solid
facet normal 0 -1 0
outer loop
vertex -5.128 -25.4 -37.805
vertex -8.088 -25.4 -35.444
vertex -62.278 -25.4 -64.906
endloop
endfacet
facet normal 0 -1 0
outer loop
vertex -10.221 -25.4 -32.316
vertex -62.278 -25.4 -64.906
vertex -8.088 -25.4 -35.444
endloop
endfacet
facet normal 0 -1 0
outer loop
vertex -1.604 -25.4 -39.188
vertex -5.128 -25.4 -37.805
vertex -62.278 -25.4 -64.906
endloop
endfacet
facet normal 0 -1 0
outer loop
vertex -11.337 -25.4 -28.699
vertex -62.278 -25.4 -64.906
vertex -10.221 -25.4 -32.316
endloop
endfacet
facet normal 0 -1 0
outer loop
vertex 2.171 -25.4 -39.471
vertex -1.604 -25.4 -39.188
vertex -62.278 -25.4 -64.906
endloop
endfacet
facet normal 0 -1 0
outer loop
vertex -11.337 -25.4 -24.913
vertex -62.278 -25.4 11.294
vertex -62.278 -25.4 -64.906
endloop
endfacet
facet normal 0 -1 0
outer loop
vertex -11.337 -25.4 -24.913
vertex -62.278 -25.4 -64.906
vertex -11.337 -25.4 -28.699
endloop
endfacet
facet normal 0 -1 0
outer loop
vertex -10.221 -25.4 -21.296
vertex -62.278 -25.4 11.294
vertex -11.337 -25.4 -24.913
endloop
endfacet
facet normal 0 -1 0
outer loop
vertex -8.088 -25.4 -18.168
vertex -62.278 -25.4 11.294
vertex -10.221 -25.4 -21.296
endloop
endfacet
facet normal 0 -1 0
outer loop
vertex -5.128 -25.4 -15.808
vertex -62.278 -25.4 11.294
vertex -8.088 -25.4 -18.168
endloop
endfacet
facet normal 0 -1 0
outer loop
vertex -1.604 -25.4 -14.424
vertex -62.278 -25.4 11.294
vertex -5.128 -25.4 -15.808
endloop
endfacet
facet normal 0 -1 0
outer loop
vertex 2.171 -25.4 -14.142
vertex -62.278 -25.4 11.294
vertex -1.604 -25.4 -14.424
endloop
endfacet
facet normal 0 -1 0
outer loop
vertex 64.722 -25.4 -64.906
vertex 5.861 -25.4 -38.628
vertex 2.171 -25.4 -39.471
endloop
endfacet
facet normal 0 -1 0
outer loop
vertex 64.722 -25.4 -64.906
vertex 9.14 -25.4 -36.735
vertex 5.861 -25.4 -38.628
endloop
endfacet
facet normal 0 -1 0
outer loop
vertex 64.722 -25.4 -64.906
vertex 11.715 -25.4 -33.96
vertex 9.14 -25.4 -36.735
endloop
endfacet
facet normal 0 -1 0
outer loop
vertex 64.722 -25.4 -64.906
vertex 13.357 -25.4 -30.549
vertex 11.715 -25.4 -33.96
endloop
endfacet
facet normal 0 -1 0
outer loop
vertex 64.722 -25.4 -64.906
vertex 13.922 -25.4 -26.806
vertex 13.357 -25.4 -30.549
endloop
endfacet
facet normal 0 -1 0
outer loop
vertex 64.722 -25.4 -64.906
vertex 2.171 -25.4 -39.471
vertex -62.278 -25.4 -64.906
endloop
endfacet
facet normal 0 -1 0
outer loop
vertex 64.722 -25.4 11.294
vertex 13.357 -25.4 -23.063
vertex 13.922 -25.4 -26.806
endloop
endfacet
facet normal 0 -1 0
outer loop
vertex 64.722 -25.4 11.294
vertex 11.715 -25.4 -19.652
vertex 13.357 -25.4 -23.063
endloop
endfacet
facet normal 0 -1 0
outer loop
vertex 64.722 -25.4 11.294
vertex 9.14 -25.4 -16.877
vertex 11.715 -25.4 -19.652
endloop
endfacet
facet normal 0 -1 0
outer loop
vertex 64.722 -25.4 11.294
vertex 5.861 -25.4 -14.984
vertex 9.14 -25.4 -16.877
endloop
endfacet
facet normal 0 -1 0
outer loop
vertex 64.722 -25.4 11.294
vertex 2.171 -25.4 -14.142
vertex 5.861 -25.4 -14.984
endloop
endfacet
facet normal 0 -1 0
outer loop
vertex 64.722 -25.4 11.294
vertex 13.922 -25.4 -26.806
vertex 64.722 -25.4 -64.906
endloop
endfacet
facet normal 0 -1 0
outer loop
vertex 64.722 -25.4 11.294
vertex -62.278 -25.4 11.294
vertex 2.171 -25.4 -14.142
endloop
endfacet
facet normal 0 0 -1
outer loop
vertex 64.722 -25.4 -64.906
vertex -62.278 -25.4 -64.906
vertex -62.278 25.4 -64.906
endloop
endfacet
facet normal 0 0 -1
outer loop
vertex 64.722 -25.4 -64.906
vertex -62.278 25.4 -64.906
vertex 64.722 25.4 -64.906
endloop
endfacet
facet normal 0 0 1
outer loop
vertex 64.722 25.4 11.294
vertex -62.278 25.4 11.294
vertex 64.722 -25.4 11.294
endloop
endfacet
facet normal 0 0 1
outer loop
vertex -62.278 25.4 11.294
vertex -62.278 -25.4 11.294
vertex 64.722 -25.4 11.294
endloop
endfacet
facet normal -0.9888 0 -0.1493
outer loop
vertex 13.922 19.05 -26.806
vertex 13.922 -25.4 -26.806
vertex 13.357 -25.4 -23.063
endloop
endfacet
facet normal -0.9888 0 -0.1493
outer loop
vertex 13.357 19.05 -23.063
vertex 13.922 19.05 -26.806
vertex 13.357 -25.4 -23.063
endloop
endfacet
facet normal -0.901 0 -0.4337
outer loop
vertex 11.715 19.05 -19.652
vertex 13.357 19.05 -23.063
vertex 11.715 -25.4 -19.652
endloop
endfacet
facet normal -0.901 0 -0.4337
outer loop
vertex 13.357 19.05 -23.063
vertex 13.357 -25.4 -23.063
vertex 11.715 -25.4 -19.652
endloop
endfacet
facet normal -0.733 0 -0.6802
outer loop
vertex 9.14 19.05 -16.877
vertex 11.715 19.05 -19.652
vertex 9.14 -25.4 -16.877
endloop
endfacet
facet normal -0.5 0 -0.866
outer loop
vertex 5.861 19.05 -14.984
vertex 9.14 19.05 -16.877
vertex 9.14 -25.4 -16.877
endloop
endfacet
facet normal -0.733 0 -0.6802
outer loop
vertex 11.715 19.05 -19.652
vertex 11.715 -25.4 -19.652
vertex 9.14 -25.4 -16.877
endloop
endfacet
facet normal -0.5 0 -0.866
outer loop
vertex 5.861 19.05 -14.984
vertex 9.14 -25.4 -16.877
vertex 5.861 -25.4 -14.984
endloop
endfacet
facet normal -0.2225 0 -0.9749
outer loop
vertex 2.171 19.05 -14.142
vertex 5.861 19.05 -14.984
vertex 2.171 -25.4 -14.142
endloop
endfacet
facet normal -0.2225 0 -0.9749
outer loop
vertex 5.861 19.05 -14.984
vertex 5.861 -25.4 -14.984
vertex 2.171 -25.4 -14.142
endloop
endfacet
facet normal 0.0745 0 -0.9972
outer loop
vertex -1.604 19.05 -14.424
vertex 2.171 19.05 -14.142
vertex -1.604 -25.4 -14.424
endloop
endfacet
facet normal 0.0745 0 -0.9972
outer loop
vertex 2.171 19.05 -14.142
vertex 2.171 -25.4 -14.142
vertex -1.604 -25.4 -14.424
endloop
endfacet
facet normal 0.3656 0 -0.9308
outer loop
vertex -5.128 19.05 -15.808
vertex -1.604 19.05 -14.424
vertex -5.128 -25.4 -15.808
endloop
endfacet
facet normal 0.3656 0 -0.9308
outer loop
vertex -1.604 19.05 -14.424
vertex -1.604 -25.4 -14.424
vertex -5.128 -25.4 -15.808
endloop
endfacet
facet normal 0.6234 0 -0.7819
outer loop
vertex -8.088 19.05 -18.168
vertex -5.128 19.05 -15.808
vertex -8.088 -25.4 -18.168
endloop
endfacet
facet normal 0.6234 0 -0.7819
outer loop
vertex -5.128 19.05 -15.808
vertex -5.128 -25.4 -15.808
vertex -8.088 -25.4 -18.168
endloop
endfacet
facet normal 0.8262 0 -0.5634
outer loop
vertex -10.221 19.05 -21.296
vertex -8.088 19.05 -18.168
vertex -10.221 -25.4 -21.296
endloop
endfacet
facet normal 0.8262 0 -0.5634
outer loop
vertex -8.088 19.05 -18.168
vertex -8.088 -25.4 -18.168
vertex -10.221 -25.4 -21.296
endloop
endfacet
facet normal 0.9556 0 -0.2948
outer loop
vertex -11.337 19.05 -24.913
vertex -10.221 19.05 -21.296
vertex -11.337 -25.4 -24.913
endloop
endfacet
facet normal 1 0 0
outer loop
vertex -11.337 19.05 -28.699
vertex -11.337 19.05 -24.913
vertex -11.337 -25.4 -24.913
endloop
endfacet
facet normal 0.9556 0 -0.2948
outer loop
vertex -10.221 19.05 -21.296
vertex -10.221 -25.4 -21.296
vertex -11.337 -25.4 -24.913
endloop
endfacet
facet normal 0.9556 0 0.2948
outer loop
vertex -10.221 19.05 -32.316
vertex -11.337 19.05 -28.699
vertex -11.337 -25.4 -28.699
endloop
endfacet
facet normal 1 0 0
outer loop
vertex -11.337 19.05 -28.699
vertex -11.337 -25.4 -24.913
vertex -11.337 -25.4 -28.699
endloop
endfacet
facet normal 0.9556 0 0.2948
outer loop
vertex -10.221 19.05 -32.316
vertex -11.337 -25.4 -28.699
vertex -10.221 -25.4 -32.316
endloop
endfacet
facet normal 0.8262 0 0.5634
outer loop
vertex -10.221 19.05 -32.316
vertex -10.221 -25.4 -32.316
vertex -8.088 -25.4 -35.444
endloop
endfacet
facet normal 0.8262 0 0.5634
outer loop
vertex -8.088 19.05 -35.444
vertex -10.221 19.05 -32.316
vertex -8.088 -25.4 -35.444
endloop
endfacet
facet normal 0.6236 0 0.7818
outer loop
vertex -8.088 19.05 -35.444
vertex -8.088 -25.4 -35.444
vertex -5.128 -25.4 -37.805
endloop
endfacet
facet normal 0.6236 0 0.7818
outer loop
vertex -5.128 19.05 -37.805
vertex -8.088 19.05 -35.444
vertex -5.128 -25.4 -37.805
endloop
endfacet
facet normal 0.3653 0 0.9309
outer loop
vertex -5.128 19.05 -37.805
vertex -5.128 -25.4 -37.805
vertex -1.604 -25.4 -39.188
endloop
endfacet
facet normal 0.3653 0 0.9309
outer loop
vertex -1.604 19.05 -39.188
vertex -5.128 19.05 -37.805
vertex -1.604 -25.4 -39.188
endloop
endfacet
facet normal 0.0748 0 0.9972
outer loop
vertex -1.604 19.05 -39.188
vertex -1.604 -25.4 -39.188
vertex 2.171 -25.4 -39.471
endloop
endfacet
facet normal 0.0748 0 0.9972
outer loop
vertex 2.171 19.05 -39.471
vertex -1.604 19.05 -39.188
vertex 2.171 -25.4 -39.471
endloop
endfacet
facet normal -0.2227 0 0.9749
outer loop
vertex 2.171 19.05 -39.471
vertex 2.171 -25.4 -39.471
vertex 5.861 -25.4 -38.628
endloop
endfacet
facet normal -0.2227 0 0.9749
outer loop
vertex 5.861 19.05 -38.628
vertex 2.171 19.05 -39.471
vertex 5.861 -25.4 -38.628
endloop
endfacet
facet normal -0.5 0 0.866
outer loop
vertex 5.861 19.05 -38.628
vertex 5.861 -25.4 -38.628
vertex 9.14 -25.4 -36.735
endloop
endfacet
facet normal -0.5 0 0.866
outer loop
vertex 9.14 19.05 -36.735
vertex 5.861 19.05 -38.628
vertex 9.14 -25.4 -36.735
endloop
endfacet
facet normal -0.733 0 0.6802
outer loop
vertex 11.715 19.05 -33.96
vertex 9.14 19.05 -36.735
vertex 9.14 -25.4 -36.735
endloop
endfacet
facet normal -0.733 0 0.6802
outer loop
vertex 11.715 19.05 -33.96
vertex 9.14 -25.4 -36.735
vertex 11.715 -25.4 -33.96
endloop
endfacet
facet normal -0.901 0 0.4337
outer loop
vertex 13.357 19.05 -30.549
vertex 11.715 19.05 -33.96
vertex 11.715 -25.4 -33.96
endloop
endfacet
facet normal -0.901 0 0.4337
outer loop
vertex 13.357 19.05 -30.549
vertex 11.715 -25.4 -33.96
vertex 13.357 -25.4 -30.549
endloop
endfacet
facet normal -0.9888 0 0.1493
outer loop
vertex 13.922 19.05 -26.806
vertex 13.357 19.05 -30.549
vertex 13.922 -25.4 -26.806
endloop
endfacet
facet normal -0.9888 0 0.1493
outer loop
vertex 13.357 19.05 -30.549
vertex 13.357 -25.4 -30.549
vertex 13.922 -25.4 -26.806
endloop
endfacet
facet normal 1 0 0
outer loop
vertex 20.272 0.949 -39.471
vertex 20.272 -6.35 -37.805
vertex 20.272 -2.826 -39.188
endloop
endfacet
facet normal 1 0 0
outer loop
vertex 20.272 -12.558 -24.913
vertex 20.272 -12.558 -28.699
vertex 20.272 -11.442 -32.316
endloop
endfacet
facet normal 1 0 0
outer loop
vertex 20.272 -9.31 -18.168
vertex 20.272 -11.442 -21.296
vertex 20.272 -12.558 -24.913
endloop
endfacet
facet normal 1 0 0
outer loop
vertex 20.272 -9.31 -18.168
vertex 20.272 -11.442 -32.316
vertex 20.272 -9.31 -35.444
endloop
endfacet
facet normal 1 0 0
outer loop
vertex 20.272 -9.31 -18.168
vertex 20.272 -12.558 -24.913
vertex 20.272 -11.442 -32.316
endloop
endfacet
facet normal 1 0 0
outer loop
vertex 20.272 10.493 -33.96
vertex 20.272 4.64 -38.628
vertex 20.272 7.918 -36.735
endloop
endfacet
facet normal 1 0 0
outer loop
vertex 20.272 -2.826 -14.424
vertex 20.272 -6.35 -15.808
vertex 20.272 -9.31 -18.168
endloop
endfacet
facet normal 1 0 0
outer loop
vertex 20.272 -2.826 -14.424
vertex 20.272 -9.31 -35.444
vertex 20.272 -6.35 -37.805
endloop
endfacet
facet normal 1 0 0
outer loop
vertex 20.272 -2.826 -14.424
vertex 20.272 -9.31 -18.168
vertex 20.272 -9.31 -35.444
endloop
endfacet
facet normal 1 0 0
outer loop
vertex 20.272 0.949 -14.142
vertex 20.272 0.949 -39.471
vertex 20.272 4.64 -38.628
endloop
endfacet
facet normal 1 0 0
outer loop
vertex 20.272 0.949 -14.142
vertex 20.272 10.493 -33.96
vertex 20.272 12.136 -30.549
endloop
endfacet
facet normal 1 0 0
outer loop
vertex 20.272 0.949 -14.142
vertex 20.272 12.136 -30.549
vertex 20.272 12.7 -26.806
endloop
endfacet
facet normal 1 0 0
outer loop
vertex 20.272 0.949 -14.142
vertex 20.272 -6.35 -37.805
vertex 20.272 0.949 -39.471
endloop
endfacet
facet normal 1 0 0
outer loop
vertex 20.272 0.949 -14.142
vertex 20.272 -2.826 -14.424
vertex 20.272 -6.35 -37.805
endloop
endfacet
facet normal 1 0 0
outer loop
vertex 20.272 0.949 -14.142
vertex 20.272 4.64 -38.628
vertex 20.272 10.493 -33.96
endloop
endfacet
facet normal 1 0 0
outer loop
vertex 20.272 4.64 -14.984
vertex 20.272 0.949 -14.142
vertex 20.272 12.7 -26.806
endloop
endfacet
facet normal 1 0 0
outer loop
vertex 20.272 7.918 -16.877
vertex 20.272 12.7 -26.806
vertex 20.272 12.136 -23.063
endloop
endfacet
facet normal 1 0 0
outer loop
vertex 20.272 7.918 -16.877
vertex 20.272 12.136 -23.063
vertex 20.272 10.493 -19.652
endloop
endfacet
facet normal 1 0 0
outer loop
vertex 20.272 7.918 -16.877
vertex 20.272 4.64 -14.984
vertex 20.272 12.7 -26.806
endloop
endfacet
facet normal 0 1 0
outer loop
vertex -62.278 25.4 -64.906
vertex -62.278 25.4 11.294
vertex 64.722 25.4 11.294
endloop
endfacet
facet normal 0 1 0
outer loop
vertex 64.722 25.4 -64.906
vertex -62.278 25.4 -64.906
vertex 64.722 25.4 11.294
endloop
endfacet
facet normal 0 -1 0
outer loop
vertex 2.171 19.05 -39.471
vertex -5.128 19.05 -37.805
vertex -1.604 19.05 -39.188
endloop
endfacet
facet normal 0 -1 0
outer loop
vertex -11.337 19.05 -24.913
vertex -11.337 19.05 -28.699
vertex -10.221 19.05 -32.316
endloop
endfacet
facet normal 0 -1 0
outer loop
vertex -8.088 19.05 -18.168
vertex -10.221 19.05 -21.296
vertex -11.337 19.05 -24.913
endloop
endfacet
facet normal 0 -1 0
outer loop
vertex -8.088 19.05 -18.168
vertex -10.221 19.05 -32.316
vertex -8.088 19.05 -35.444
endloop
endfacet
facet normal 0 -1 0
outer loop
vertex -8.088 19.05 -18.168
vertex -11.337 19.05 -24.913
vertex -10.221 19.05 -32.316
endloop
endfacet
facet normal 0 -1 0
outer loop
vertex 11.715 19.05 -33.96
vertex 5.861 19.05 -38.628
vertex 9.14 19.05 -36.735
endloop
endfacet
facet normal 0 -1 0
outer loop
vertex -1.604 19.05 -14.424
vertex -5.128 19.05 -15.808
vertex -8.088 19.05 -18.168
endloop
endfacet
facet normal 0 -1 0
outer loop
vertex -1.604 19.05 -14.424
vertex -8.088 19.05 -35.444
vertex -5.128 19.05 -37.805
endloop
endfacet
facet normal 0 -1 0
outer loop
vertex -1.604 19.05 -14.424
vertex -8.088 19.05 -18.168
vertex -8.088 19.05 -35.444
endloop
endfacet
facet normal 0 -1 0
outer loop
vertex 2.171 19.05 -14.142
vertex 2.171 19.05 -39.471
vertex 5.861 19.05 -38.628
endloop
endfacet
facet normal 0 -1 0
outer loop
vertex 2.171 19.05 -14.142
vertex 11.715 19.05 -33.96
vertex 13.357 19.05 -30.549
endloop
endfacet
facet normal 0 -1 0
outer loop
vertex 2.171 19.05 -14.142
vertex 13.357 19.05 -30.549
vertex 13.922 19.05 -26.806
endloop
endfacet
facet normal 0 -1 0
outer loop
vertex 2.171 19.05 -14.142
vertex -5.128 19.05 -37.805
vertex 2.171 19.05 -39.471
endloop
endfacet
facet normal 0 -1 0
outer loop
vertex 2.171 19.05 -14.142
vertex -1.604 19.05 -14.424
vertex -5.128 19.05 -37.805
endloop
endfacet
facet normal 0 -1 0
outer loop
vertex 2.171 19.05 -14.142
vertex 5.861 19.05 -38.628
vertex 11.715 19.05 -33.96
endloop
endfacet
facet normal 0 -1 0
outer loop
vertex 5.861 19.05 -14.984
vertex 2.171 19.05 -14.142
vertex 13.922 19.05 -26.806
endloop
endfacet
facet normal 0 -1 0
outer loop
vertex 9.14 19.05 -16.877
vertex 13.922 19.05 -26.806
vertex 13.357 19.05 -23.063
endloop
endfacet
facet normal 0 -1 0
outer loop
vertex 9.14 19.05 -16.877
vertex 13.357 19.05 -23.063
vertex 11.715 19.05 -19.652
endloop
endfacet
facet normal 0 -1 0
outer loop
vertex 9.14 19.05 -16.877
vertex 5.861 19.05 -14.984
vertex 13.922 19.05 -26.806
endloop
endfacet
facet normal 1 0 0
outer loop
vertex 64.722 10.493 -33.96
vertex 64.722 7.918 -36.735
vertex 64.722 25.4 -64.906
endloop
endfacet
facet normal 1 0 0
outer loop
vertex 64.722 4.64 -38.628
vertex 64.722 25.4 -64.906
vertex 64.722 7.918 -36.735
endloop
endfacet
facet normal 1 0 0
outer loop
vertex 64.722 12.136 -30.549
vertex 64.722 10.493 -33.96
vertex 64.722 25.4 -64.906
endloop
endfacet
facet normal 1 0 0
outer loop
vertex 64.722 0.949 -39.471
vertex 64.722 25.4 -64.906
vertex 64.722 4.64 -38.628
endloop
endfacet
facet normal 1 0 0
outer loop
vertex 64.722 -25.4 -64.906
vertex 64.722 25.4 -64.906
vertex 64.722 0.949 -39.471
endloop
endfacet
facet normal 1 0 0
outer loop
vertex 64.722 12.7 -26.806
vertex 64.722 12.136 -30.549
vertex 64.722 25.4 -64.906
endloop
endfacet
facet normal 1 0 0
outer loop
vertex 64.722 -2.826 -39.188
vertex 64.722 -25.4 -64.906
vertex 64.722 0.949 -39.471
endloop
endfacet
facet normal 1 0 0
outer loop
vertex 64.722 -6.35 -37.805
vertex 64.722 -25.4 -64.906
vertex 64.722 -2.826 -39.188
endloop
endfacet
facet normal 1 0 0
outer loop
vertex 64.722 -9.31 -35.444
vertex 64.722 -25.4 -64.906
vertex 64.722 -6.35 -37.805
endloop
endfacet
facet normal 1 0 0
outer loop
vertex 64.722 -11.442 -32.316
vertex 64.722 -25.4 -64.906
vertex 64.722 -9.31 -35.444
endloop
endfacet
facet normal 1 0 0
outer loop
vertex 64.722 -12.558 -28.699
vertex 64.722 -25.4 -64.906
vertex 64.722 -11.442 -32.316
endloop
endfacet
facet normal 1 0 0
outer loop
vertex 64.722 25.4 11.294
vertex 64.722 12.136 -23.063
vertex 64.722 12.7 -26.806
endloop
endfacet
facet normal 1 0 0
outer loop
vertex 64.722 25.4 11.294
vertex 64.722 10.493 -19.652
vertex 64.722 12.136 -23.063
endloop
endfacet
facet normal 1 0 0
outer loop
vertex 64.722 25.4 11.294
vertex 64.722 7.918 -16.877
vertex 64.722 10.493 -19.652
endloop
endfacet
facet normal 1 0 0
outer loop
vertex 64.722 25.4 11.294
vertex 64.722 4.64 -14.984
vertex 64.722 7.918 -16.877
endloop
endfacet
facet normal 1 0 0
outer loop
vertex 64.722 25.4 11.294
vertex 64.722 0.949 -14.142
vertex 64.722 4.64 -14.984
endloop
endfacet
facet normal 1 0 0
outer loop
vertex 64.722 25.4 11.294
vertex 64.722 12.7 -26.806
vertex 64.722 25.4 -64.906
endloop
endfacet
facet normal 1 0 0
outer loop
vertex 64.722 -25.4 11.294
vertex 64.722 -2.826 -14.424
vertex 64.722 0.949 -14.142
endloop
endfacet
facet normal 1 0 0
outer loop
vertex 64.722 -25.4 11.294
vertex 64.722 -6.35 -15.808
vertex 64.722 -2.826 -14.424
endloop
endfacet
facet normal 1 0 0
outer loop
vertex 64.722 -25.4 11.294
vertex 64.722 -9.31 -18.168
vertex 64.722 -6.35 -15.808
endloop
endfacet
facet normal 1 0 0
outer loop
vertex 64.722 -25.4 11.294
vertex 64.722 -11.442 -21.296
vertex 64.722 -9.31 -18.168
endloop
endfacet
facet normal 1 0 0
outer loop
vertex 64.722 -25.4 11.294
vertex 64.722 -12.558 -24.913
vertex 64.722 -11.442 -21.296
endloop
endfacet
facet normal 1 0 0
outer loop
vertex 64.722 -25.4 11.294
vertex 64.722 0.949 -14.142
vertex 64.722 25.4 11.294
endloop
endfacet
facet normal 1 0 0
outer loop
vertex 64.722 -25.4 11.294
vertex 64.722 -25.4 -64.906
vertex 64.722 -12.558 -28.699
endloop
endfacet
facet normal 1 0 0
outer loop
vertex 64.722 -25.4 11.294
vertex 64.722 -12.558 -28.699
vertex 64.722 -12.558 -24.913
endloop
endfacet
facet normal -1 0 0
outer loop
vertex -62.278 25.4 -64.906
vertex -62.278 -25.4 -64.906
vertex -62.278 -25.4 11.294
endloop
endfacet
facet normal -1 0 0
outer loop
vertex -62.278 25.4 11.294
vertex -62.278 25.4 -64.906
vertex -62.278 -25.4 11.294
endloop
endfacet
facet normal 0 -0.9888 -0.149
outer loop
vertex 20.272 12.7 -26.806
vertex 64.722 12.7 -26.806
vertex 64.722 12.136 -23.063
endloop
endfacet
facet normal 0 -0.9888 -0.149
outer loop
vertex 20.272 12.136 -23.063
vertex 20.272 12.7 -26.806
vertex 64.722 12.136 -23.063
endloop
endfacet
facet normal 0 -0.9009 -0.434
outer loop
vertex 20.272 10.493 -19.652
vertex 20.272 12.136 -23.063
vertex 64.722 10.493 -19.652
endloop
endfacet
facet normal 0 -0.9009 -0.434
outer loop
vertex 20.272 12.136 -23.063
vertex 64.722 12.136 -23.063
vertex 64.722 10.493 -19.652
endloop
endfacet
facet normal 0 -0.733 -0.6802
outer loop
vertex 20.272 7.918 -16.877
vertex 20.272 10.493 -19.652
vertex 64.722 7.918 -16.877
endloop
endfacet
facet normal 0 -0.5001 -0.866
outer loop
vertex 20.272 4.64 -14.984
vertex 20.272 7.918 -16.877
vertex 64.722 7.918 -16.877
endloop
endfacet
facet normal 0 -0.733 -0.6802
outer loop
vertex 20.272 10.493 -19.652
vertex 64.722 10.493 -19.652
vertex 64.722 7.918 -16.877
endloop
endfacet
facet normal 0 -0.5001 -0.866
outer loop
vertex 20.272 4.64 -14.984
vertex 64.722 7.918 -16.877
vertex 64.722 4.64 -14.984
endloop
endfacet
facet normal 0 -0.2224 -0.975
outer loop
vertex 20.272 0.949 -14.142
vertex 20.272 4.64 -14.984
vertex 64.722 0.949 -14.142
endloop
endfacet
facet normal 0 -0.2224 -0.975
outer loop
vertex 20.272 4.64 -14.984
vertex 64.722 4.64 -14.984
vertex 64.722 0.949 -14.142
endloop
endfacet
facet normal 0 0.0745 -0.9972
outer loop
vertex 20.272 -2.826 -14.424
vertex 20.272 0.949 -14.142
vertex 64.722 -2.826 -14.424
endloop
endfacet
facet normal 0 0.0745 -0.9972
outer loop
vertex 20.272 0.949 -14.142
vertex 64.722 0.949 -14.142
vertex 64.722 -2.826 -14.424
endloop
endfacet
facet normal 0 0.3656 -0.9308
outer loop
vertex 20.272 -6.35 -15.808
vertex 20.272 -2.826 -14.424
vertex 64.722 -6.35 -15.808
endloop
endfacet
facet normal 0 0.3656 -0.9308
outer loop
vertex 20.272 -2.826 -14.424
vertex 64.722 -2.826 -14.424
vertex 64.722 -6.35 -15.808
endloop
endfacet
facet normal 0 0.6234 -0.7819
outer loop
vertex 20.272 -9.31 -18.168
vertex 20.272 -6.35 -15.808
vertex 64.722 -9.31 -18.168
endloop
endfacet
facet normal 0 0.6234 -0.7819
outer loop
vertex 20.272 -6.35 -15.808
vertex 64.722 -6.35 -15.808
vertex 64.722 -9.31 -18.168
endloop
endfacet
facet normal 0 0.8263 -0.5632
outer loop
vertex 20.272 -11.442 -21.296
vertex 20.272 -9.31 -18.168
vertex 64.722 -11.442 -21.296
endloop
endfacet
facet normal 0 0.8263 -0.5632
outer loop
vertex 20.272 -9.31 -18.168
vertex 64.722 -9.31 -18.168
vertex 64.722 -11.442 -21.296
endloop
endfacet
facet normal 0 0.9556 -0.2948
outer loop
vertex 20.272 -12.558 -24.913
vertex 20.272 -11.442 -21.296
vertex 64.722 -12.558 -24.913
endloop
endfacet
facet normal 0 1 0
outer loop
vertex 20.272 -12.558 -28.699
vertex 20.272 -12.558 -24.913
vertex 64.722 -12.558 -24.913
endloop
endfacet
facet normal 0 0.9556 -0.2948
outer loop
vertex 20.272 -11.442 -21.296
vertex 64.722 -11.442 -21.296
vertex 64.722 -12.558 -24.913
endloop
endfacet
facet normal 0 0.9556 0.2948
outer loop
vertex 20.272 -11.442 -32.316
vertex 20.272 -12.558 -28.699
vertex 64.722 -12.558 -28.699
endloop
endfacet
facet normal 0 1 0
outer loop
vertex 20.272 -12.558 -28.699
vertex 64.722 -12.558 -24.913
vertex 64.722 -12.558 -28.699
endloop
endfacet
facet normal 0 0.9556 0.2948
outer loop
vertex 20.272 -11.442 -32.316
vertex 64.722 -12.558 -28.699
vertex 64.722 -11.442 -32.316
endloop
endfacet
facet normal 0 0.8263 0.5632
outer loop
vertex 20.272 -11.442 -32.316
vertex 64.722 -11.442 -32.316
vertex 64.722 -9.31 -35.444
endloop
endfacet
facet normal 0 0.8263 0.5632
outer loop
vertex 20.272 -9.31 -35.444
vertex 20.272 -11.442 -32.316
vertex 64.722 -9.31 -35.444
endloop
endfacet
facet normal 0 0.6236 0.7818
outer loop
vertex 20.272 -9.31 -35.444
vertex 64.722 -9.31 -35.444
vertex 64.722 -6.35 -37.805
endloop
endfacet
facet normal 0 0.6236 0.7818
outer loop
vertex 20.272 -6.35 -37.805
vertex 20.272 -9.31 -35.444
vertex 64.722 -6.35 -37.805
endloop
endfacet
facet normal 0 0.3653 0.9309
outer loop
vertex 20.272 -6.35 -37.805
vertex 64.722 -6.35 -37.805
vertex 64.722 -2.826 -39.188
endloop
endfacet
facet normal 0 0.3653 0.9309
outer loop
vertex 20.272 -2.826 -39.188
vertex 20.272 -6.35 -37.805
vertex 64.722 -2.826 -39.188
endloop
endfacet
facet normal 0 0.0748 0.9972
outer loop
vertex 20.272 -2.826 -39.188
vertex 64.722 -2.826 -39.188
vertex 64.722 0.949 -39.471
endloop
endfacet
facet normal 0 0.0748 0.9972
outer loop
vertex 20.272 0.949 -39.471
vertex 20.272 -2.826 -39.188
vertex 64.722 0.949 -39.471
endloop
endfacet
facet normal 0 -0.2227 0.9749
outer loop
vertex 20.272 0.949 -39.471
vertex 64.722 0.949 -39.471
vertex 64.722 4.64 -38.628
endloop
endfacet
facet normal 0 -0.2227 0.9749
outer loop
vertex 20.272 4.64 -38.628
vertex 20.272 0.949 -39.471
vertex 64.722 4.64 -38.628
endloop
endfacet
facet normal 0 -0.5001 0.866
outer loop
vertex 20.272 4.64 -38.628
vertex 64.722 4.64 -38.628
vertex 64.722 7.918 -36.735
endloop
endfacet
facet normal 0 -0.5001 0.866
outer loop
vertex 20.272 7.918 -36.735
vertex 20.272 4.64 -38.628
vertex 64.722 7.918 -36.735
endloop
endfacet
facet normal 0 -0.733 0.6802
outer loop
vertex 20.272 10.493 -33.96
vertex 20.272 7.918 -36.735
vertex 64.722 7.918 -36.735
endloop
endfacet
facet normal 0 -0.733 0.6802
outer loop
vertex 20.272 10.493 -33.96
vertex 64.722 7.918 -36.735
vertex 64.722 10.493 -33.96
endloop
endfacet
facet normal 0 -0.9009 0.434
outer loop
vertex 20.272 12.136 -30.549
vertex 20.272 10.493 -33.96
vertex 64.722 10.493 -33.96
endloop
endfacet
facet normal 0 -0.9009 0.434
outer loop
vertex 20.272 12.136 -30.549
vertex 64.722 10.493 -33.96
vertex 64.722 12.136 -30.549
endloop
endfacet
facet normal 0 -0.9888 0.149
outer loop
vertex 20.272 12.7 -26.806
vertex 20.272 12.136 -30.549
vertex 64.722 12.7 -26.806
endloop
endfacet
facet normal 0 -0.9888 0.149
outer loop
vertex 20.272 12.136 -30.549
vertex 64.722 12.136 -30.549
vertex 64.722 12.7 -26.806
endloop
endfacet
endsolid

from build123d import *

# Parameters (mm, degrees)
F0_W          = 127
F0_H          = 76.2
F1_DEPTH      = 25.4
F1_DEPTH_BACK = 25.4
F2_R          = 12.7
F3_DEPTH      = 44.45
F4_R          = 12.7
F5_DEPTH      = 44.45


# Not quite as in the source:
# - a feature names something its author has since deleted; it is built from what else it names


with BuildPart() as f1:
    # F0 (on Front) → F1 (new body, two sides)
    with BuildSketch(Plane.XZ) as f1_sk:
        with Locations((1.2215264142, -26.8060624134)):
            Rectangle(F0_W, F0_H)
    extrude(amount=F1_DEPTH)
    extrude(f1_sk.sketch, amount=-F1_DEPTH_BACK)

    # F2 (on face) → F3 (cut)
    with BuildSketch(Plane.XZ.offset(25.4)):
        with Locations((1.2215264142, -26.8060624134)):
            Circle(F2_R)
    extrude(amount=-F3_DEPTH, mode=Mode.SUBTRACT)

    # F4 (on face) → F5 (cut)
    with BuildSketch(Plane.YZ.offset(64.7215264142)):
        with Locations((0, -26.8060624134)):
            Circle(F4_R)
    extrude(amount=-F5_DEPTH, mode=Mode.SUBTRACT)


solid = f1.part
